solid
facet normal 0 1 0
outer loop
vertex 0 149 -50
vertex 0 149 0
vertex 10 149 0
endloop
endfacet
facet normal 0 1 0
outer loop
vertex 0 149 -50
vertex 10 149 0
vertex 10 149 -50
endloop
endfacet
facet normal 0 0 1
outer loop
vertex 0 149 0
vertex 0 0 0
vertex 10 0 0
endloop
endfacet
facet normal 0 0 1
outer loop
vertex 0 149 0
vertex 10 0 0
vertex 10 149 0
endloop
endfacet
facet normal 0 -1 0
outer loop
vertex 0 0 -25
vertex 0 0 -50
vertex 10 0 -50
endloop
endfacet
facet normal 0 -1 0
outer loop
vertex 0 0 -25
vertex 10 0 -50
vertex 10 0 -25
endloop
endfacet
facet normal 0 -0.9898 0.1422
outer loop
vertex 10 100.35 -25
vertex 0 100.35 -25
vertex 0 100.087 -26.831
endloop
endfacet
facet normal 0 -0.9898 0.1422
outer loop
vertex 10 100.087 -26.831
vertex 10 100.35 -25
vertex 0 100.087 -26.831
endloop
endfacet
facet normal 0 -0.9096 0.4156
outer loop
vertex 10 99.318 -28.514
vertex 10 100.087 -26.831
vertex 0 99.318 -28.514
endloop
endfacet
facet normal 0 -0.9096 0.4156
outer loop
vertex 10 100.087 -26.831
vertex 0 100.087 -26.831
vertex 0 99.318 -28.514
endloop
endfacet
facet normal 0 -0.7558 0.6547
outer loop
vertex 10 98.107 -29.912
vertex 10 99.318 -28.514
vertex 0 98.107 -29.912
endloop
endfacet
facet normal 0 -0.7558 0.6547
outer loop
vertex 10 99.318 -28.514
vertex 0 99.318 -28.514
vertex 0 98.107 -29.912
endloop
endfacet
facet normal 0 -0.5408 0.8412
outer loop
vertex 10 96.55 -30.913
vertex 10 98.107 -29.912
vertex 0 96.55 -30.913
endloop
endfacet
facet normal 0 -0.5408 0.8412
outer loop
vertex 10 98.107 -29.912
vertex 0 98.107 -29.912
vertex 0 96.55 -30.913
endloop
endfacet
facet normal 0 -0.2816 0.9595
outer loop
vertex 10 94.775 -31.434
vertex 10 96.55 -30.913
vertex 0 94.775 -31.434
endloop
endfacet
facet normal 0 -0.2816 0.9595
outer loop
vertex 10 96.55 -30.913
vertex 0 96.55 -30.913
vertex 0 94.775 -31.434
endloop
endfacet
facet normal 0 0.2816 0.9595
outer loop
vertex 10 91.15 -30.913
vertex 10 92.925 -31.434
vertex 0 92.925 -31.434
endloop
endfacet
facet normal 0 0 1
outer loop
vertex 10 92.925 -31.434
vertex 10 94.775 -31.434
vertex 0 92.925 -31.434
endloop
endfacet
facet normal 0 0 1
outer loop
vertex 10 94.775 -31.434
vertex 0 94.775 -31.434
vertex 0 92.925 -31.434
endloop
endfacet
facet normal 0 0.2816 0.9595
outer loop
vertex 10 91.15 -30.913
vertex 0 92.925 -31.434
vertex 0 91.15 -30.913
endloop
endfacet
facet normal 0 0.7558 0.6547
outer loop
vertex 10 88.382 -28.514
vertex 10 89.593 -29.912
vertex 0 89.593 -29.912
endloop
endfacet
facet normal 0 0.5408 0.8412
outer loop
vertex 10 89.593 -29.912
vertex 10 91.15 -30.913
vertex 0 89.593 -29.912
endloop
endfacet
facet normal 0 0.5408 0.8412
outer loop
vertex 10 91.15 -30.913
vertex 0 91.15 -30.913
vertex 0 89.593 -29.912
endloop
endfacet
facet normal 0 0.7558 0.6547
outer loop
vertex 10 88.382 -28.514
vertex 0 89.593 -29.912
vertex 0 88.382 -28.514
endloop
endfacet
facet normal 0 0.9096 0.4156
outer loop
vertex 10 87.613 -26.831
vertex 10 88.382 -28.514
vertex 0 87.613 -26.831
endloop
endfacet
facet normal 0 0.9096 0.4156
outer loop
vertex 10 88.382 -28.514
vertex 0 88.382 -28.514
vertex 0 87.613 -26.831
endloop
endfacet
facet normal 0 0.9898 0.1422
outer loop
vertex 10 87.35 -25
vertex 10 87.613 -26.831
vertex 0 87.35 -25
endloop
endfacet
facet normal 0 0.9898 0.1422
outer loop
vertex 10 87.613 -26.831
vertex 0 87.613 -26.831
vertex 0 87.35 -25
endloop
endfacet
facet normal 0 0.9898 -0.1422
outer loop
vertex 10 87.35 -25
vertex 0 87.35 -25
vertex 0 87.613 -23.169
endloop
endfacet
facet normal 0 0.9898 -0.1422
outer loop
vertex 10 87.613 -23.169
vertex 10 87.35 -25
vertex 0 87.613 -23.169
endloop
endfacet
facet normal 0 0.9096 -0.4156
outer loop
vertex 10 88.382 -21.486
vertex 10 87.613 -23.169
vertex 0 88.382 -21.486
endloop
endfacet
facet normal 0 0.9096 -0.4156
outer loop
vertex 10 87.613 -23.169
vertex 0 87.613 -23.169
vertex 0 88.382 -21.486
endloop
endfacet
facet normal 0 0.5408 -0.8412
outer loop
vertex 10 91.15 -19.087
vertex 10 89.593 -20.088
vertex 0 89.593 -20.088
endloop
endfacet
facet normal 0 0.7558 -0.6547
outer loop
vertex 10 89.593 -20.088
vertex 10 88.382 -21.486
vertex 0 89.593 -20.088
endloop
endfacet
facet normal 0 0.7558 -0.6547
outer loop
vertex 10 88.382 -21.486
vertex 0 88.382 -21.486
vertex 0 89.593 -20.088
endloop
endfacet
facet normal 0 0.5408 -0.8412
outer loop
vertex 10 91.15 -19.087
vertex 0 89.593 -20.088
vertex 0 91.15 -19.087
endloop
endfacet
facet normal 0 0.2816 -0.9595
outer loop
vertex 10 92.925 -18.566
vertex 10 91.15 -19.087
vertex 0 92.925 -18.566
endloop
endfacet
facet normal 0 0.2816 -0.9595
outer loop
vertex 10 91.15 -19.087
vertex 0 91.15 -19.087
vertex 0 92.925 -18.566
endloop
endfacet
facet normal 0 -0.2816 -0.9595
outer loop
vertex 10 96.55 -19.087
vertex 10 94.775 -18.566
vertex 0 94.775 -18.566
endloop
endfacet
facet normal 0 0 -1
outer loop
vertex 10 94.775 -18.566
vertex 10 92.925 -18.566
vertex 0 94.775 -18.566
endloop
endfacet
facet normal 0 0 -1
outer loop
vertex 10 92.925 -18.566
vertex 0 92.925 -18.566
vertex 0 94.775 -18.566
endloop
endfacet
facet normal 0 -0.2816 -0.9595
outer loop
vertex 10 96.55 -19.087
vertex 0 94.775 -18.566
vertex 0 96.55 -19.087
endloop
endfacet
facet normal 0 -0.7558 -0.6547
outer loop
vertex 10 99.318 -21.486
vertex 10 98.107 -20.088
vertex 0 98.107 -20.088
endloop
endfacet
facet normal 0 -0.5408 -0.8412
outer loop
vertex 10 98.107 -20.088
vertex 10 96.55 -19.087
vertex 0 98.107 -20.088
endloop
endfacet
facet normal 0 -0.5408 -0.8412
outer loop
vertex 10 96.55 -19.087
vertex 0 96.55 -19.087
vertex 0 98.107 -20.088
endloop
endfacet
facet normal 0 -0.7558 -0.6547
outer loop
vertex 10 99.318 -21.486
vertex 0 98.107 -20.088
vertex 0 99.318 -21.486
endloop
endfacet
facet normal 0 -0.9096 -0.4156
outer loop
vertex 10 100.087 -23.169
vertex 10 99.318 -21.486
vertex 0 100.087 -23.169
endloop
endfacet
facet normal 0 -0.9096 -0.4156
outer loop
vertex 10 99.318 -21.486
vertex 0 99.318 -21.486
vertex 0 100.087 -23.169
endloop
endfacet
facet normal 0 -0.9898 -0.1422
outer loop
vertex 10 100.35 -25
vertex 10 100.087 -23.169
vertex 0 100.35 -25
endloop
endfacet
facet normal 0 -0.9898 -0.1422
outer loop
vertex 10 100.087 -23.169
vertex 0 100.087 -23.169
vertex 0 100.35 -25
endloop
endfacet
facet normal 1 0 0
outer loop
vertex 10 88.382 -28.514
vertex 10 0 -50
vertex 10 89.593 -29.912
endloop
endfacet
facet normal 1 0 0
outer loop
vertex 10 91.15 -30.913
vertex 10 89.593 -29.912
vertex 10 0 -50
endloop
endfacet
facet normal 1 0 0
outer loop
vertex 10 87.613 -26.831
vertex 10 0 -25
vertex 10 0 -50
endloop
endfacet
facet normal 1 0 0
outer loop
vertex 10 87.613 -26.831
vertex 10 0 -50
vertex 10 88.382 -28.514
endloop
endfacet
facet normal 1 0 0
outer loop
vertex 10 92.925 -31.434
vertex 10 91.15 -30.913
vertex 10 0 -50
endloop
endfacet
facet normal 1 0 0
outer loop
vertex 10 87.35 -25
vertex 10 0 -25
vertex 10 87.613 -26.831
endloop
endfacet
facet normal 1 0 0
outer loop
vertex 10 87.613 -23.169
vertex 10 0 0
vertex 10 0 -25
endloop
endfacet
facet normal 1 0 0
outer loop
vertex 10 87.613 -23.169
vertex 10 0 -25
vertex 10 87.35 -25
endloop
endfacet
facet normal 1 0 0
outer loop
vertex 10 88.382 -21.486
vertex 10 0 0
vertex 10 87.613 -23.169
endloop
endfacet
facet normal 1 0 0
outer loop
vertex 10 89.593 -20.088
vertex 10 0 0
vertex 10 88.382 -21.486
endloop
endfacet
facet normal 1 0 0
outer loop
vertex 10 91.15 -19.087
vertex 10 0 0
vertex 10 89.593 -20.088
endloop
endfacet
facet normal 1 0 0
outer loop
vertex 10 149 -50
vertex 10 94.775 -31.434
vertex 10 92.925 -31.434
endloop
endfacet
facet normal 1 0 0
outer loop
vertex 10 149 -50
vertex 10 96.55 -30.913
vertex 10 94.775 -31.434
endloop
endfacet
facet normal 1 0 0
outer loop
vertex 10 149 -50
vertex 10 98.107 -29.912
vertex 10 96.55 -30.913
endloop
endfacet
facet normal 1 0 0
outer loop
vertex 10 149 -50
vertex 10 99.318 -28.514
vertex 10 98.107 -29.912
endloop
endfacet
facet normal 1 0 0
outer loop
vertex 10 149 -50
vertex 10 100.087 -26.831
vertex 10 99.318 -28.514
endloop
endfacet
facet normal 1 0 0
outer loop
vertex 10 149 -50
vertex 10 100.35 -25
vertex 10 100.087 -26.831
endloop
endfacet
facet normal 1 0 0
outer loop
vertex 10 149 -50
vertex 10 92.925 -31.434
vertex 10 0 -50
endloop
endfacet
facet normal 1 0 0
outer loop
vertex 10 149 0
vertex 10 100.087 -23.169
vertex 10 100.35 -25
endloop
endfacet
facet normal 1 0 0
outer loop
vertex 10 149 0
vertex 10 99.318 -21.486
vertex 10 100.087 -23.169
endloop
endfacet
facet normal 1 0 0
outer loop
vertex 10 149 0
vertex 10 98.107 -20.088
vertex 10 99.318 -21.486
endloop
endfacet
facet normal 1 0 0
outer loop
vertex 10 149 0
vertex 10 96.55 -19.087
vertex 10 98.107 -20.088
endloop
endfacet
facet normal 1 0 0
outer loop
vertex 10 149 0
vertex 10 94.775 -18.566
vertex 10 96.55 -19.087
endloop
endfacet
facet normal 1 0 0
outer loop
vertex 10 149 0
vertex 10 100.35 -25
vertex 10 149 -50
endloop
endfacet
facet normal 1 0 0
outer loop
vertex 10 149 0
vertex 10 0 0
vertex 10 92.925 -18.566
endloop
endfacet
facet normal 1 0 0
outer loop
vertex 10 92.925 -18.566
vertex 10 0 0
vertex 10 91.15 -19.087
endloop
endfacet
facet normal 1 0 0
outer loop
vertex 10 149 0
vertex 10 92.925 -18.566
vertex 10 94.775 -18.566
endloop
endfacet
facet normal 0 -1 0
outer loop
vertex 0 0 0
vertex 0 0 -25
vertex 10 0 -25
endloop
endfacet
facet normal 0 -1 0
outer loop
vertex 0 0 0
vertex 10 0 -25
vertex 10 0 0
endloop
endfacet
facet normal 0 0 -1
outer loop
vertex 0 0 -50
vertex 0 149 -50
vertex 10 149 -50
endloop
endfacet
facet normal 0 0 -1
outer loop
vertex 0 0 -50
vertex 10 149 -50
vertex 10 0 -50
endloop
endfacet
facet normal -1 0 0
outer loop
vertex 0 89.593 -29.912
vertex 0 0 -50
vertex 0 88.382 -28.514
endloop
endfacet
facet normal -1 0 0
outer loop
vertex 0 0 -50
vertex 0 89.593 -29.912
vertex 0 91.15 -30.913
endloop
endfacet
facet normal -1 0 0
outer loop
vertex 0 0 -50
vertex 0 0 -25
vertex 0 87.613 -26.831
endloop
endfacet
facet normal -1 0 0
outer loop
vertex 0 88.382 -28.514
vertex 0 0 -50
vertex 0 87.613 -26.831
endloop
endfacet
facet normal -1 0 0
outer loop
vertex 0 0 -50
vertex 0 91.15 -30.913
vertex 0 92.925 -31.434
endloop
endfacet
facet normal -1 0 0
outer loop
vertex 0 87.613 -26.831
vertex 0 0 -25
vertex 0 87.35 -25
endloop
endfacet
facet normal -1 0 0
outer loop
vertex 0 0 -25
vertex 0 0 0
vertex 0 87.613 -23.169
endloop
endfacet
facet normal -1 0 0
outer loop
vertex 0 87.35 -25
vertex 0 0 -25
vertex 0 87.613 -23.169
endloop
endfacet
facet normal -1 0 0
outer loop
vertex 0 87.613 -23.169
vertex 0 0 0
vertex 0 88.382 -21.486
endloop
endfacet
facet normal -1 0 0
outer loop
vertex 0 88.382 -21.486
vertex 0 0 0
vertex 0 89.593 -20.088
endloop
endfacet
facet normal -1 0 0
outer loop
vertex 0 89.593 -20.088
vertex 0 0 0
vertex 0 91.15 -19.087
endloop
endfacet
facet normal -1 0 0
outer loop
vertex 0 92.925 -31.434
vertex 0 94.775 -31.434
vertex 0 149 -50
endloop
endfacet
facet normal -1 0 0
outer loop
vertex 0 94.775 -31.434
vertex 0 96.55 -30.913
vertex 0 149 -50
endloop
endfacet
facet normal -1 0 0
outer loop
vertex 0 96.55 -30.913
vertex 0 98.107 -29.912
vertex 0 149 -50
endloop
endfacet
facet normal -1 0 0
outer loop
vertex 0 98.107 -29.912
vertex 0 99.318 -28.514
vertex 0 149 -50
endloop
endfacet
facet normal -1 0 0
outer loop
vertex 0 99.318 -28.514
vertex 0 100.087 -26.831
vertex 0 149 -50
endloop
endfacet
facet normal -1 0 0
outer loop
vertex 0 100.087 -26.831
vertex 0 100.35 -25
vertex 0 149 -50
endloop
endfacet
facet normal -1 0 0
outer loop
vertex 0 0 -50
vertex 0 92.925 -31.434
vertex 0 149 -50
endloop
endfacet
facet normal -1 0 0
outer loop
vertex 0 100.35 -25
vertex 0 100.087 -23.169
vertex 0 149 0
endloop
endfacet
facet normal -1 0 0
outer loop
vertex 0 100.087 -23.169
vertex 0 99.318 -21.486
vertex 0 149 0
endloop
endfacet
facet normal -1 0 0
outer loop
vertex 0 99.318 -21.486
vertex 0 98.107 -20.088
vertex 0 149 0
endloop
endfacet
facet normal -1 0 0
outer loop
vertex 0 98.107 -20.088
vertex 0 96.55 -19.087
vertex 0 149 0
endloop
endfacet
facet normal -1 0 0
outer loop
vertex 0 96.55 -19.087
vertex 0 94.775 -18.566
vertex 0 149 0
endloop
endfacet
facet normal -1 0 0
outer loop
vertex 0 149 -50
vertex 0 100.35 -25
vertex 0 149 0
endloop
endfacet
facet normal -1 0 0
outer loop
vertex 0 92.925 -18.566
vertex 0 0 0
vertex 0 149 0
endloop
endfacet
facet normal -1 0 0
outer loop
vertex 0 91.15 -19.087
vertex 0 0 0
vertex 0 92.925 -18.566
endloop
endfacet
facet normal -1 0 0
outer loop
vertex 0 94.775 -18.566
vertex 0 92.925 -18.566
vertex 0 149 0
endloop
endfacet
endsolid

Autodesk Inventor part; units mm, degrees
ref_plane "YZ Plane" through (0, 0, 0) normal (1, 0, 0) x (0, 1, 0)
ref_plane "XZ Plane" through (0, 0, 0) normal (0, 1, 0) x (-1, 0, 0)
ref_plane "XY Plane" through (0, 0, 0) normal (0, 0, 1) x (1, 0, 0)
sketch "Sketch1" plane through (0, 0, 0) normal (1, 0, 0) x (0, 1, 0)
  line L0 (0, 0) -> (149, 0)
  line L1 (149, 0) -> (149, -50)
  line L2 (149, -50) -> (0, -50)
  line L3 (0, -50) -> (0, 0)
  line L4 (0, -25) -> (93.85, -25)
  circle A0 centre (93.85, -25) radius 6.5
  dimension "d0" = 149
  dimension "d1" = 50
  dimension "d2" = 93.85
  dimension "d3" = 13
extrude "Extrusion1" add sketch "Sketch1" along normal blind 10
properties part number "tallwall1"
